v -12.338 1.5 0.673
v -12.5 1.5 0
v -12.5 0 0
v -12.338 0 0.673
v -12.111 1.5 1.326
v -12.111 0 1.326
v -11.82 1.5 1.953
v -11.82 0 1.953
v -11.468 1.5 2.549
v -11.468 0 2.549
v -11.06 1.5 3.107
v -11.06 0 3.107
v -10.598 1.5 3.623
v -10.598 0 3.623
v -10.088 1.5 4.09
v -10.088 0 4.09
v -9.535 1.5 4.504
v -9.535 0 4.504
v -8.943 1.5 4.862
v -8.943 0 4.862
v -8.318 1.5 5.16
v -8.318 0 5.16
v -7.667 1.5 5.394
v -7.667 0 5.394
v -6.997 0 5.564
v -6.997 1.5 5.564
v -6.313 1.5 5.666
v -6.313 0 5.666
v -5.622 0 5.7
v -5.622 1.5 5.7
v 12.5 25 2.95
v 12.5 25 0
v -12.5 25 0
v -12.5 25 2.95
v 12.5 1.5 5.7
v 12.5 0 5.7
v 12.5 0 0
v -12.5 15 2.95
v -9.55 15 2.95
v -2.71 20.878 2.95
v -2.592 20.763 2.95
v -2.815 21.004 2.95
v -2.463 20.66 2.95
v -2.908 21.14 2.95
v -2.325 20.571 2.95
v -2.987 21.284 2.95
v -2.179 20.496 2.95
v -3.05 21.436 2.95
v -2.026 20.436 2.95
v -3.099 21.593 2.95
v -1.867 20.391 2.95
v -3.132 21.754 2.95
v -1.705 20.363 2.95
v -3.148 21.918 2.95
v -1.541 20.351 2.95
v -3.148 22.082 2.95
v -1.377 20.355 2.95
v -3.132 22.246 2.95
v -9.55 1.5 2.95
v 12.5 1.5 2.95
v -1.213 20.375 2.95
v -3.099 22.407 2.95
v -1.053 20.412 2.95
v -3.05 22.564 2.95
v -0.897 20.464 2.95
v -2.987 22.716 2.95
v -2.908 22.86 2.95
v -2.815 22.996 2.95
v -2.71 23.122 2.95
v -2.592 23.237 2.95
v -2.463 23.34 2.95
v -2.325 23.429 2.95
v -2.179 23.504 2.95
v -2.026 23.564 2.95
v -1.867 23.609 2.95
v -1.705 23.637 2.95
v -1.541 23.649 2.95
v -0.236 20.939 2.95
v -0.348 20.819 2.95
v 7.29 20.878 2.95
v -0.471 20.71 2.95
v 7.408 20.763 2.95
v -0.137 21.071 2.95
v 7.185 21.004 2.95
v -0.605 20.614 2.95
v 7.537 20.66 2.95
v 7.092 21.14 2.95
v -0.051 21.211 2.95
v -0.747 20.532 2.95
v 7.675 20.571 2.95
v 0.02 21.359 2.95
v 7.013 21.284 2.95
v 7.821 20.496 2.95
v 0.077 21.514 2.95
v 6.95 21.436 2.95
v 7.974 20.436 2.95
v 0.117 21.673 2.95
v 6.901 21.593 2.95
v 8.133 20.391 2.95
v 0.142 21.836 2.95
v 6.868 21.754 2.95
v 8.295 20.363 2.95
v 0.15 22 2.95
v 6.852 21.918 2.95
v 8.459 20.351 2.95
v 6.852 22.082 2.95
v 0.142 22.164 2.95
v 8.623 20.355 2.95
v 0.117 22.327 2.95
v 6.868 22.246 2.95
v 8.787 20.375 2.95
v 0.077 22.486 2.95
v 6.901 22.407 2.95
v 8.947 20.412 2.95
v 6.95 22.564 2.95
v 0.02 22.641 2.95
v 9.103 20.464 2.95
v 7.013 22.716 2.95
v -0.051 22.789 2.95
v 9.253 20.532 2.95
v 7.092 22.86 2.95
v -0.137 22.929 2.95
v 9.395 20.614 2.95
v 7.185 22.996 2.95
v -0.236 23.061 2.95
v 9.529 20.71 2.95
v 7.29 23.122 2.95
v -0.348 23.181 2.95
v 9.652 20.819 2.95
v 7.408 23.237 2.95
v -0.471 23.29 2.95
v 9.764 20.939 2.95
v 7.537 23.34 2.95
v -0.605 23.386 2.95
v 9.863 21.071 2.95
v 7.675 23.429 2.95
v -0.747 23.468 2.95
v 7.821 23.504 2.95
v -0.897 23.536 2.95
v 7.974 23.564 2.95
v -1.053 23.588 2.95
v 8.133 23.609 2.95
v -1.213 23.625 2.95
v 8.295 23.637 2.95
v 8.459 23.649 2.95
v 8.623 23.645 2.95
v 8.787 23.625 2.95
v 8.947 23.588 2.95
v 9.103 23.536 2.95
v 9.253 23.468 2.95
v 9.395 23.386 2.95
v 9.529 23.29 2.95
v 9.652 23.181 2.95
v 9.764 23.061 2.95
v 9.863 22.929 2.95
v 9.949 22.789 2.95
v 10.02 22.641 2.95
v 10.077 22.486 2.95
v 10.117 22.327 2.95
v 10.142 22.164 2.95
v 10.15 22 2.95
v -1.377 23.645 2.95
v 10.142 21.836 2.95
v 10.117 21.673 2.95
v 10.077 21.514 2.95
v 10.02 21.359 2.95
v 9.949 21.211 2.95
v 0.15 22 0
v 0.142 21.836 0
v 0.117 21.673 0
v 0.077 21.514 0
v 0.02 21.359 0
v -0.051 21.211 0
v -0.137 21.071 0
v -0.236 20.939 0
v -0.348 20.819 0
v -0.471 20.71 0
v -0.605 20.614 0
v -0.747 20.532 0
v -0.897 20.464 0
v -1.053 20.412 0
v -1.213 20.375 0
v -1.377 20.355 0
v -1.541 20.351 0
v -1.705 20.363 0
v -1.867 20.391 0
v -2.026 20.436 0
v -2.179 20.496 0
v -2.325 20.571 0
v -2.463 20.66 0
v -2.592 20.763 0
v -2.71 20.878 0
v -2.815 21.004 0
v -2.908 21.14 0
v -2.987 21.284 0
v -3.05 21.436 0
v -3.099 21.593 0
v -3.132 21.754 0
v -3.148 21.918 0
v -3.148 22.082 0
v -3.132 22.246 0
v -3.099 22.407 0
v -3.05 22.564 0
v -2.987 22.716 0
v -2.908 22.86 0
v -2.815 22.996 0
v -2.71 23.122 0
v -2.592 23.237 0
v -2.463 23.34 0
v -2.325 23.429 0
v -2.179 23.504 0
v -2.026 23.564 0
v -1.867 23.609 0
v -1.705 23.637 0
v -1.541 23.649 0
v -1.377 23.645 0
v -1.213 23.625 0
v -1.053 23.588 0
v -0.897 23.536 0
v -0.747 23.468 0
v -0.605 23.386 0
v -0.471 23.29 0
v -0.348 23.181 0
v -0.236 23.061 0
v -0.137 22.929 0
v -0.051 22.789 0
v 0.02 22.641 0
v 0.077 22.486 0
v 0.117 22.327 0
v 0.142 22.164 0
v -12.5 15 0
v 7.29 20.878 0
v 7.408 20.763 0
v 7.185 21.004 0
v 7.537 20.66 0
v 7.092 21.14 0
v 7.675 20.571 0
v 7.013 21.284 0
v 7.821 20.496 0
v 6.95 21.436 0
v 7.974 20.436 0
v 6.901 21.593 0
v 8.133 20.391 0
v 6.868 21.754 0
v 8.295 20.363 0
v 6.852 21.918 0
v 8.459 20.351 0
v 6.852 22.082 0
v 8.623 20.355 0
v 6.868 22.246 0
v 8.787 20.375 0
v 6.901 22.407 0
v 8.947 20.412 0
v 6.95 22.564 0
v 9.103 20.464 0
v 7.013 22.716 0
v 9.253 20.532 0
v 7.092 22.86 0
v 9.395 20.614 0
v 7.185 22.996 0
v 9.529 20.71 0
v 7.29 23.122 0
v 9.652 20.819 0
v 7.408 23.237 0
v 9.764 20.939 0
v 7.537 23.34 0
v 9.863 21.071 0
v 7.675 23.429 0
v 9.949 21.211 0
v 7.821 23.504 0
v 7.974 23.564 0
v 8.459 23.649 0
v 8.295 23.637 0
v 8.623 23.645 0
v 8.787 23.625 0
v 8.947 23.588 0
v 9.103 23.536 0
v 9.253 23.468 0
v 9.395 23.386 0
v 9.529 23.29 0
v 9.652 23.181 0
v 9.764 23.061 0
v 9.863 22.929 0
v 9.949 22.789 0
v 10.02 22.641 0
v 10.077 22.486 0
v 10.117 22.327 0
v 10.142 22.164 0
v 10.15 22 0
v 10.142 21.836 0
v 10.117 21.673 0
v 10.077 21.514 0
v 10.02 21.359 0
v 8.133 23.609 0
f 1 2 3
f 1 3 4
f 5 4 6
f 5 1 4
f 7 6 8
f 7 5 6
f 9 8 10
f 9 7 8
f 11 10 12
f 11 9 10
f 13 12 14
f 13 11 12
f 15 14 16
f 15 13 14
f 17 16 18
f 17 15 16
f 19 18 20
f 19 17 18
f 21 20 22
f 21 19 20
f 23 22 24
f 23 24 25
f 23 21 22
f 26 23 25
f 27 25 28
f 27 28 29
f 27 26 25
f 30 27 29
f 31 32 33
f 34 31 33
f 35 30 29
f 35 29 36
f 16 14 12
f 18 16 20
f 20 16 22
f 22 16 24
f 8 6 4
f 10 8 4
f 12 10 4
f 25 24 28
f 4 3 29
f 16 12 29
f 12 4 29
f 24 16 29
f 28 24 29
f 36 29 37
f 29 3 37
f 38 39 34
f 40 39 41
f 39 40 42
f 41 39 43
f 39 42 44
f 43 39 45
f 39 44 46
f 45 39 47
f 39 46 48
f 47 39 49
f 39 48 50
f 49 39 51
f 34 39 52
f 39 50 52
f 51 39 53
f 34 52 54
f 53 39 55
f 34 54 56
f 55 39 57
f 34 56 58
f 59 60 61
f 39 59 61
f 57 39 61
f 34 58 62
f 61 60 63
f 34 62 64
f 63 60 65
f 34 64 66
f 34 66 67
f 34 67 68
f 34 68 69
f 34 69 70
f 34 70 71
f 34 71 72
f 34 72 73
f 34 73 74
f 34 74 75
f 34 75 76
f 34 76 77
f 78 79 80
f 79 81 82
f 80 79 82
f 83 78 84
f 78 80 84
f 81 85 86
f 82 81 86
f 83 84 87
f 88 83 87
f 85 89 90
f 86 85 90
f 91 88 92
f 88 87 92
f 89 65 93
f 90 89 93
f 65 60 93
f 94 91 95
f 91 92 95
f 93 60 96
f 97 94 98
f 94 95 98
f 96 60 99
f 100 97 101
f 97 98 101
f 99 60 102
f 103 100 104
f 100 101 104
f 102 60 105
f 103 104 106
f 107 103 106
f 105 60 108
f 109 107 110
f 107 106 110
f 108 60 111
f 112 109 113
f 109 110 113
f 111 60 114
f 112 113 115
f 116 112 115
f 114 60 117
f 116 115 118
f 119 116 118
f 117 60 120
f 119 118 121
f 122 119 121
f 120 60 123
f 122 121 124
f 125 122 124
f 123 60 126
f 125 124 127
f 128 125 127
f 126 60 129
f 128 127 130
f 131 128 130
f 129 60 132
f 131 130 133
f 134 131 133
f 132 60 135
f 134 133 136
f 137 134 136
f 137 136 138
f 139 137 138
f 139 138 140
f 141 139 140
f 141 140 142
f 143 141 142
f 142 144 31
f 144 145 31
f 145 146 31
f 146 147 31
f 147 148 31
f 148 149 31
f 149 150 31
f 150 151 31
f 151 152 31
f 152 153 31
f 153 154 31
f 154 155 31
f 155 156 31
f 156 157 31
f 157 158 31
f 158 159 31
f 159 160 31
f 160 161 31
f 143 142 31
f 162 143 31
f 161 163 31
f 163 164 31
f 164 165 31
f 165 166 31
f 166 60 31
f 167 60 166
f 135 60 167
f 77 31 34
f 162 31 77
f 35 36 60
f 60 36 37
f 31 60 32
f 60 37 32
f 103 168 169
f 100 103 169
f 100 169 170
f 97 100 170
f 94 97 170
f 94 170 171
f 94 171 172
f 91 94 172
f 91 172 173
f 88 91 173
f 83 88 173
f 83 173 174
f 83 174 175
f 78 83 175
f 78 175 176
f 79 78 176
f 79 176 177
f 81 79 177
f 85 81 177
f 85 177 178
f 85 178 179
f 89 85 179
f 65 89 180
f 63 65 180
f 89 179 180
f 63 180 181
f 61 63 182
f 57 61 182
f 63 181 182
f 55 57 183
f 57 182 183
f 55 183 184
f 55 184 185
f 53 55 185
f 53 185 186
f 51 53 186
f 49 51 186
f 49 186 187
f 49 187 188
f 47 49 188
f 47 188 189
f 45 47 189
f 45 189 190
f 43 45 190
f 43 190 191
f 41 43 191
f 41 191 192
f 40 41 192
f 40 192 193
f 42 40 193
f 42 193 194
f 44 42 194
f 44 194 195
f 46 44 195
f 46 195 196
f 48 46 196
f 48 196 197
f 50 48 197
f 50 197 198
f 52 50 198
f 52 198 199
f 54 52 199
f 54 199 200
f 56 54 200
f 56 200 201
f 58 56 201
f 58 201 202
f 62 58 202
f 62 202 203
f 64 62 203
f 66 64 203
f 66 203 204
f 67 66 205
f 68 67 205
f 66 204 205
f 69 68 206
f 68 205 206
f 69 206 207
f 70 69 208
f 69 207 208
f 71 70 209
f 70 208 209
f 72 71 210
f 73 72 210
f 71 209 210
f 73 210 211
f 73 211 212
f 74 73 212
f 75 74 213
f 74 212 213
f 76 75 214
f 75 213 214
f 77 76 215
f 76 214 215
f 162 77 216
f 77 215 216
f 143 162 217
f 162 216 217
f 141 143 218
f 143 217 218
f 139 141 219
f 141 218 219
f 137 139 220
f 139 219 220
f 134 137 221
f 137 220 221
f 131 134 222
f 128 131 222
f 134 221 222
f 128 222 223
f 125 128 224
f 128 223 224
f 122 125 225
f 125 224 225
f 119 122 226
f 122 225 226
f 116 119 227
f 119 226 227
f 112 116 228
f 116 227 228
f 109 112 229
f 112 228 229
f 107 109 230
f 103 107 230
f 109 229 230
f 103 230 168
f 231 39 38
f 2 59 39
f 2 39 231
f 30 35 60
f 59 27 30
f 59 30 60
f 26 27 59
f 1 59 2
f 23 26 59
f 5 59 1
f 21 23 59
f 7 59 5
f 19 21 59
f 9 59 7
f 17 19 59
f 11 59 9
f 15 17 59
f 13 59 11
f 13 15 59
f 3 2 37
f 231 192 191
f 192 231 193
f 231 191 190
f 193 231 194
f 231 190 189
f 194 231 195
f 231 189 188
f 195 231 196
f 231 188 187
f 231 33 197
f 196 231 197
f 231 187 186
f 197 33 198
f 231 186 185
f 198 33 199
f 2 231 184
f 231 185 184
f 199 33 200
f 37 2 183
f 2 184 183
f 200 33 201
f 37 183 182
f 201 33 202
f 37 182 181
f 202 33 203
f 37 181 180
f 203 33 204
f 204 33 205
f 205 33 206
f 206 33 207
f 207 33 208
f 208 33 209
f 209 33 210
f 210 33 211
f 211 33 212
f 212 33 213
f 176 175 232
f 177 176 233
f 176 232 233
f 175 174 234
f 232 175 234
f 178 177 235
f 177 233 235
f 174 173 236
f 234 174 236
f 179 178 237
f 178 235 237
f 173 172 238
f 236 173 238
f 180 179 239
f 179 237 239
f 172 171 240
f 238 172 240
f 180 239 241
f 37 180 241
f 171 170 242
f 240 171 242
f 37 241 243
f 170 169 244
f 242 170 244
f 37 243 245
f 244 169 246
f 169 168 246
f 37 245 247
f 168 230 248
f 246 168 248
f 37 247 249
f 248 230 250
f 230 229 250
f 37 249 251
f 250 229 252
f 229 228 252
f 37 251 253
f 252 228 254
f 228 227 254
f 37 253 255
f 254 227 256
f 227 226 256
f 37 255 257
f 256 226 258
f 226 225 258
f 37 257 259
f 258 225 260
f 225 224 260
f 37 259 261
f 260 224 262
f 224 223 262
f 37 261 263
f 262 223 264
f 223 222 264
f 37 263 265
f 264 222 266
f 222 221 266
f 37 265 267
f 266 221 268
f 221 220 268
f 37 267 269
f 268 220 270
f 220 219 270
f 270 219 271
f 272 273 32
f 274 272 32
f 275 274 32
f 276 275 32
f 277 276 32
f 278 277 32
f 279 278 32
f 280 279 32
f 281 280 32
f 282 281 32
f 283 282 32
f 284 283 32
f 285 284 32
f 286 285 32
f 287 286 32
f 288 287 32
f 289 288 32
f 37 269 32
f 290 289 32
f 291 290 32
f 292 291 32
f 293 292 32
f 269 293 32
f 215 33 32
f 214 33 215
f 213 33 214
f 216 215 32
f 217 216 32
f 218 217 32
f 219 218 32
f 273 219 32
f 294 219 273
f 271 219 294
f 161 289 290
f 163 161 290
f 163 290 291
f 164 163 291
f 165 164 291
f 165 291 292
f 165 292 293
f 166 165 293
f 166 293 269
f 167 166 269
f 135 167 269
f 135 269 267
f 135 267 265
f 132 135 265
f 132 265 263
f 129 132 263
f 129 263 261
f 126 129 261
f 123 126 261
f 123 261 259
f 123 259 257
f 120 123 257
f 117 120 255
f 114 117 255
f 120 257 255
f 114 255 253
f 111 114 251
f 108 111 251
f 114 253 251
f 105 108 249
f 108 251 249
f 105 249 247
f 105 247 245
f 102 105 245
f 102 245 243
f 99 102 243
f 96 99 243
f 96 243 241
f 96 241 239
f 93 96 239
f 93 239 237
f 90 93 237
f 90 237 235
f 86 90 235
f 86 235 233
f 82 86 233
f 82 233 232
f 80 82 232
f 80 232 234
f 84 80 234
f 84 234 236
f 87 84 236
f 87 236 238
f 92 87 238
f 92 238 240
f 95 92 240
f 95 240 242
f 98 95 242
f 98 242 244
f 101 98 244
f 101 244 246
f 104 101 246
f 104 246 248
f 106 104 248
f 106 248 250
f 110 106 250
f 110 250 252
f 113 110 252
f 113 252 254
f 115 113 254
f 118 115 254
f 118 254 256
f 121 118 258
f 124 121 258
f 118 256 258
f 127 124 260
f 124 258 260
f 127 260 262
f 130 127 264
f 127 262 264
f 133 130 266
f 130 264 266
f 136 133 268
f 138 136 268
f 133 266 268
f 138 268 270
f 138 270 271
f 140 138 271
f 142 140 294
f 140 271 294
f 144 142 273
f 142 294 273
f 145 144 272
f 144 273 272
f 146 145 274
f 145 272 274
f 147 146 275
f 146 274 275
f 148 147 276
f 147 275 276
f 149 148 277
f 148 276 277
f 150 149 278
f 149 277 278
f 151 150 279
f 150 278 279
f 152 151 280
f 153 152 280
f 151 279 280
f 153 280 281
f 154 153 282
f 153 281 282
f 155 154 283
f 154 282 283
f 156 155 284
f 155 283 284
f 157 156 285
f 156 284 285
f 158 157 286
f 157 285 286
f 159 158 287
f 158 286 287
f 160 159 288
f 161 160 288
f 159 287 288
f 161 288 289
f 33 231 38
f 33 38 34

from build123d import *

# Parameters (mm, degrees)
F0_W        = 12.5
F0_H        = 25
F1_DEPTH    = 5.7
F2_W        = 23.5
F2_H        = 2.75
F3_DEPTH    = 25.001
F5_DEPTH    = 13.5
F6_T4_DEPTH = 35.8911325781
F7_R        = 1.65
F8_DEPTH    = 5.701


# Not quite as in the source:
# - a fillet or chamfer that OpenCascade refuses, or shapes differently, is made with other operations: its cross-section is extruded or revolved along the edge and cut away or added


with BuildPart() as f1:
    # F0 (on Top) → F1 (new body)
    with BuildSketch(Plane.XY):
        with Locations((-6.25, 12.5)):
            Rectangle(F0_W, F0_H)
        with Locations((6.25, 12.5)):
            Rectangle(F0_W, F0_H)
    extrude(amount=F1_DEPTH)

    # F2 (on face) → F3 (cut, through all)
    with BuildSketch(Plane.YZ.offset(12.5)):
        with Locations((13.25, 4.325)):
            Rectangle(F2_W, F2_H)
    extrude(amount=-F3_DEPTH, mode=Mode.SUBTRACT)

    # F4 (on face) → F5 (cut)
    with BuildSketch(Plane(origin=(0, 1.5, 0), x_dir=(-1, 0, 0), z_dir=(0, 1, 0))):
        Polygon((9.55, 2.95), (12.5, 0), (12.5, 2.95), align=None)
    extrude(amount=F5_DEPTH, mode=Mode.SUBTRACT)

    # F6: fillet of radius 7 on 1 edges, made by hand


with BuildPart() as f6_tool2:
    # F6_s3 → F6_t4 (new body)
    with BuildSketch(Plane.XZ.offset(-18.695566289)):
        with BuildLine():
            ThreePointArc((-12.5, 0), (-10.0883157712, 4.0898051913), (-5.6217734844, 5.7))
            Line((-5.6217734844, 5.7), (-12.5, 5.7))
            Line((-12.5, 5.7), (-12.5, 0))
        make_face()
    extrude(amount=F6_T4_DEPTH)

    split(bisect_by=Plane.XZ.offset(-15), keep=Keep.TOP)


with BuildPart() as f1_1:
    add(f1.part)

    # F6_t1: cut F6_tool2
    add(f6_tool2.part, mode=Mode.SUBTRACT)

    # F7 (on face) → F8 (cut, through all)
    with BuildSketch(Plane(origin=(0, 0, 0), x_dir=(1, 0, 0), z_dir=(0, 0, -1))):
        with Locations((-1.5, -22)):
            Circle(F7_R)
        with Locations((8.5, -22)):
            Circle(F7_R)
    extrude(amount=-F8_DEPTH, mode=Mode.SUBTRACT)


solid = f1_1.part
